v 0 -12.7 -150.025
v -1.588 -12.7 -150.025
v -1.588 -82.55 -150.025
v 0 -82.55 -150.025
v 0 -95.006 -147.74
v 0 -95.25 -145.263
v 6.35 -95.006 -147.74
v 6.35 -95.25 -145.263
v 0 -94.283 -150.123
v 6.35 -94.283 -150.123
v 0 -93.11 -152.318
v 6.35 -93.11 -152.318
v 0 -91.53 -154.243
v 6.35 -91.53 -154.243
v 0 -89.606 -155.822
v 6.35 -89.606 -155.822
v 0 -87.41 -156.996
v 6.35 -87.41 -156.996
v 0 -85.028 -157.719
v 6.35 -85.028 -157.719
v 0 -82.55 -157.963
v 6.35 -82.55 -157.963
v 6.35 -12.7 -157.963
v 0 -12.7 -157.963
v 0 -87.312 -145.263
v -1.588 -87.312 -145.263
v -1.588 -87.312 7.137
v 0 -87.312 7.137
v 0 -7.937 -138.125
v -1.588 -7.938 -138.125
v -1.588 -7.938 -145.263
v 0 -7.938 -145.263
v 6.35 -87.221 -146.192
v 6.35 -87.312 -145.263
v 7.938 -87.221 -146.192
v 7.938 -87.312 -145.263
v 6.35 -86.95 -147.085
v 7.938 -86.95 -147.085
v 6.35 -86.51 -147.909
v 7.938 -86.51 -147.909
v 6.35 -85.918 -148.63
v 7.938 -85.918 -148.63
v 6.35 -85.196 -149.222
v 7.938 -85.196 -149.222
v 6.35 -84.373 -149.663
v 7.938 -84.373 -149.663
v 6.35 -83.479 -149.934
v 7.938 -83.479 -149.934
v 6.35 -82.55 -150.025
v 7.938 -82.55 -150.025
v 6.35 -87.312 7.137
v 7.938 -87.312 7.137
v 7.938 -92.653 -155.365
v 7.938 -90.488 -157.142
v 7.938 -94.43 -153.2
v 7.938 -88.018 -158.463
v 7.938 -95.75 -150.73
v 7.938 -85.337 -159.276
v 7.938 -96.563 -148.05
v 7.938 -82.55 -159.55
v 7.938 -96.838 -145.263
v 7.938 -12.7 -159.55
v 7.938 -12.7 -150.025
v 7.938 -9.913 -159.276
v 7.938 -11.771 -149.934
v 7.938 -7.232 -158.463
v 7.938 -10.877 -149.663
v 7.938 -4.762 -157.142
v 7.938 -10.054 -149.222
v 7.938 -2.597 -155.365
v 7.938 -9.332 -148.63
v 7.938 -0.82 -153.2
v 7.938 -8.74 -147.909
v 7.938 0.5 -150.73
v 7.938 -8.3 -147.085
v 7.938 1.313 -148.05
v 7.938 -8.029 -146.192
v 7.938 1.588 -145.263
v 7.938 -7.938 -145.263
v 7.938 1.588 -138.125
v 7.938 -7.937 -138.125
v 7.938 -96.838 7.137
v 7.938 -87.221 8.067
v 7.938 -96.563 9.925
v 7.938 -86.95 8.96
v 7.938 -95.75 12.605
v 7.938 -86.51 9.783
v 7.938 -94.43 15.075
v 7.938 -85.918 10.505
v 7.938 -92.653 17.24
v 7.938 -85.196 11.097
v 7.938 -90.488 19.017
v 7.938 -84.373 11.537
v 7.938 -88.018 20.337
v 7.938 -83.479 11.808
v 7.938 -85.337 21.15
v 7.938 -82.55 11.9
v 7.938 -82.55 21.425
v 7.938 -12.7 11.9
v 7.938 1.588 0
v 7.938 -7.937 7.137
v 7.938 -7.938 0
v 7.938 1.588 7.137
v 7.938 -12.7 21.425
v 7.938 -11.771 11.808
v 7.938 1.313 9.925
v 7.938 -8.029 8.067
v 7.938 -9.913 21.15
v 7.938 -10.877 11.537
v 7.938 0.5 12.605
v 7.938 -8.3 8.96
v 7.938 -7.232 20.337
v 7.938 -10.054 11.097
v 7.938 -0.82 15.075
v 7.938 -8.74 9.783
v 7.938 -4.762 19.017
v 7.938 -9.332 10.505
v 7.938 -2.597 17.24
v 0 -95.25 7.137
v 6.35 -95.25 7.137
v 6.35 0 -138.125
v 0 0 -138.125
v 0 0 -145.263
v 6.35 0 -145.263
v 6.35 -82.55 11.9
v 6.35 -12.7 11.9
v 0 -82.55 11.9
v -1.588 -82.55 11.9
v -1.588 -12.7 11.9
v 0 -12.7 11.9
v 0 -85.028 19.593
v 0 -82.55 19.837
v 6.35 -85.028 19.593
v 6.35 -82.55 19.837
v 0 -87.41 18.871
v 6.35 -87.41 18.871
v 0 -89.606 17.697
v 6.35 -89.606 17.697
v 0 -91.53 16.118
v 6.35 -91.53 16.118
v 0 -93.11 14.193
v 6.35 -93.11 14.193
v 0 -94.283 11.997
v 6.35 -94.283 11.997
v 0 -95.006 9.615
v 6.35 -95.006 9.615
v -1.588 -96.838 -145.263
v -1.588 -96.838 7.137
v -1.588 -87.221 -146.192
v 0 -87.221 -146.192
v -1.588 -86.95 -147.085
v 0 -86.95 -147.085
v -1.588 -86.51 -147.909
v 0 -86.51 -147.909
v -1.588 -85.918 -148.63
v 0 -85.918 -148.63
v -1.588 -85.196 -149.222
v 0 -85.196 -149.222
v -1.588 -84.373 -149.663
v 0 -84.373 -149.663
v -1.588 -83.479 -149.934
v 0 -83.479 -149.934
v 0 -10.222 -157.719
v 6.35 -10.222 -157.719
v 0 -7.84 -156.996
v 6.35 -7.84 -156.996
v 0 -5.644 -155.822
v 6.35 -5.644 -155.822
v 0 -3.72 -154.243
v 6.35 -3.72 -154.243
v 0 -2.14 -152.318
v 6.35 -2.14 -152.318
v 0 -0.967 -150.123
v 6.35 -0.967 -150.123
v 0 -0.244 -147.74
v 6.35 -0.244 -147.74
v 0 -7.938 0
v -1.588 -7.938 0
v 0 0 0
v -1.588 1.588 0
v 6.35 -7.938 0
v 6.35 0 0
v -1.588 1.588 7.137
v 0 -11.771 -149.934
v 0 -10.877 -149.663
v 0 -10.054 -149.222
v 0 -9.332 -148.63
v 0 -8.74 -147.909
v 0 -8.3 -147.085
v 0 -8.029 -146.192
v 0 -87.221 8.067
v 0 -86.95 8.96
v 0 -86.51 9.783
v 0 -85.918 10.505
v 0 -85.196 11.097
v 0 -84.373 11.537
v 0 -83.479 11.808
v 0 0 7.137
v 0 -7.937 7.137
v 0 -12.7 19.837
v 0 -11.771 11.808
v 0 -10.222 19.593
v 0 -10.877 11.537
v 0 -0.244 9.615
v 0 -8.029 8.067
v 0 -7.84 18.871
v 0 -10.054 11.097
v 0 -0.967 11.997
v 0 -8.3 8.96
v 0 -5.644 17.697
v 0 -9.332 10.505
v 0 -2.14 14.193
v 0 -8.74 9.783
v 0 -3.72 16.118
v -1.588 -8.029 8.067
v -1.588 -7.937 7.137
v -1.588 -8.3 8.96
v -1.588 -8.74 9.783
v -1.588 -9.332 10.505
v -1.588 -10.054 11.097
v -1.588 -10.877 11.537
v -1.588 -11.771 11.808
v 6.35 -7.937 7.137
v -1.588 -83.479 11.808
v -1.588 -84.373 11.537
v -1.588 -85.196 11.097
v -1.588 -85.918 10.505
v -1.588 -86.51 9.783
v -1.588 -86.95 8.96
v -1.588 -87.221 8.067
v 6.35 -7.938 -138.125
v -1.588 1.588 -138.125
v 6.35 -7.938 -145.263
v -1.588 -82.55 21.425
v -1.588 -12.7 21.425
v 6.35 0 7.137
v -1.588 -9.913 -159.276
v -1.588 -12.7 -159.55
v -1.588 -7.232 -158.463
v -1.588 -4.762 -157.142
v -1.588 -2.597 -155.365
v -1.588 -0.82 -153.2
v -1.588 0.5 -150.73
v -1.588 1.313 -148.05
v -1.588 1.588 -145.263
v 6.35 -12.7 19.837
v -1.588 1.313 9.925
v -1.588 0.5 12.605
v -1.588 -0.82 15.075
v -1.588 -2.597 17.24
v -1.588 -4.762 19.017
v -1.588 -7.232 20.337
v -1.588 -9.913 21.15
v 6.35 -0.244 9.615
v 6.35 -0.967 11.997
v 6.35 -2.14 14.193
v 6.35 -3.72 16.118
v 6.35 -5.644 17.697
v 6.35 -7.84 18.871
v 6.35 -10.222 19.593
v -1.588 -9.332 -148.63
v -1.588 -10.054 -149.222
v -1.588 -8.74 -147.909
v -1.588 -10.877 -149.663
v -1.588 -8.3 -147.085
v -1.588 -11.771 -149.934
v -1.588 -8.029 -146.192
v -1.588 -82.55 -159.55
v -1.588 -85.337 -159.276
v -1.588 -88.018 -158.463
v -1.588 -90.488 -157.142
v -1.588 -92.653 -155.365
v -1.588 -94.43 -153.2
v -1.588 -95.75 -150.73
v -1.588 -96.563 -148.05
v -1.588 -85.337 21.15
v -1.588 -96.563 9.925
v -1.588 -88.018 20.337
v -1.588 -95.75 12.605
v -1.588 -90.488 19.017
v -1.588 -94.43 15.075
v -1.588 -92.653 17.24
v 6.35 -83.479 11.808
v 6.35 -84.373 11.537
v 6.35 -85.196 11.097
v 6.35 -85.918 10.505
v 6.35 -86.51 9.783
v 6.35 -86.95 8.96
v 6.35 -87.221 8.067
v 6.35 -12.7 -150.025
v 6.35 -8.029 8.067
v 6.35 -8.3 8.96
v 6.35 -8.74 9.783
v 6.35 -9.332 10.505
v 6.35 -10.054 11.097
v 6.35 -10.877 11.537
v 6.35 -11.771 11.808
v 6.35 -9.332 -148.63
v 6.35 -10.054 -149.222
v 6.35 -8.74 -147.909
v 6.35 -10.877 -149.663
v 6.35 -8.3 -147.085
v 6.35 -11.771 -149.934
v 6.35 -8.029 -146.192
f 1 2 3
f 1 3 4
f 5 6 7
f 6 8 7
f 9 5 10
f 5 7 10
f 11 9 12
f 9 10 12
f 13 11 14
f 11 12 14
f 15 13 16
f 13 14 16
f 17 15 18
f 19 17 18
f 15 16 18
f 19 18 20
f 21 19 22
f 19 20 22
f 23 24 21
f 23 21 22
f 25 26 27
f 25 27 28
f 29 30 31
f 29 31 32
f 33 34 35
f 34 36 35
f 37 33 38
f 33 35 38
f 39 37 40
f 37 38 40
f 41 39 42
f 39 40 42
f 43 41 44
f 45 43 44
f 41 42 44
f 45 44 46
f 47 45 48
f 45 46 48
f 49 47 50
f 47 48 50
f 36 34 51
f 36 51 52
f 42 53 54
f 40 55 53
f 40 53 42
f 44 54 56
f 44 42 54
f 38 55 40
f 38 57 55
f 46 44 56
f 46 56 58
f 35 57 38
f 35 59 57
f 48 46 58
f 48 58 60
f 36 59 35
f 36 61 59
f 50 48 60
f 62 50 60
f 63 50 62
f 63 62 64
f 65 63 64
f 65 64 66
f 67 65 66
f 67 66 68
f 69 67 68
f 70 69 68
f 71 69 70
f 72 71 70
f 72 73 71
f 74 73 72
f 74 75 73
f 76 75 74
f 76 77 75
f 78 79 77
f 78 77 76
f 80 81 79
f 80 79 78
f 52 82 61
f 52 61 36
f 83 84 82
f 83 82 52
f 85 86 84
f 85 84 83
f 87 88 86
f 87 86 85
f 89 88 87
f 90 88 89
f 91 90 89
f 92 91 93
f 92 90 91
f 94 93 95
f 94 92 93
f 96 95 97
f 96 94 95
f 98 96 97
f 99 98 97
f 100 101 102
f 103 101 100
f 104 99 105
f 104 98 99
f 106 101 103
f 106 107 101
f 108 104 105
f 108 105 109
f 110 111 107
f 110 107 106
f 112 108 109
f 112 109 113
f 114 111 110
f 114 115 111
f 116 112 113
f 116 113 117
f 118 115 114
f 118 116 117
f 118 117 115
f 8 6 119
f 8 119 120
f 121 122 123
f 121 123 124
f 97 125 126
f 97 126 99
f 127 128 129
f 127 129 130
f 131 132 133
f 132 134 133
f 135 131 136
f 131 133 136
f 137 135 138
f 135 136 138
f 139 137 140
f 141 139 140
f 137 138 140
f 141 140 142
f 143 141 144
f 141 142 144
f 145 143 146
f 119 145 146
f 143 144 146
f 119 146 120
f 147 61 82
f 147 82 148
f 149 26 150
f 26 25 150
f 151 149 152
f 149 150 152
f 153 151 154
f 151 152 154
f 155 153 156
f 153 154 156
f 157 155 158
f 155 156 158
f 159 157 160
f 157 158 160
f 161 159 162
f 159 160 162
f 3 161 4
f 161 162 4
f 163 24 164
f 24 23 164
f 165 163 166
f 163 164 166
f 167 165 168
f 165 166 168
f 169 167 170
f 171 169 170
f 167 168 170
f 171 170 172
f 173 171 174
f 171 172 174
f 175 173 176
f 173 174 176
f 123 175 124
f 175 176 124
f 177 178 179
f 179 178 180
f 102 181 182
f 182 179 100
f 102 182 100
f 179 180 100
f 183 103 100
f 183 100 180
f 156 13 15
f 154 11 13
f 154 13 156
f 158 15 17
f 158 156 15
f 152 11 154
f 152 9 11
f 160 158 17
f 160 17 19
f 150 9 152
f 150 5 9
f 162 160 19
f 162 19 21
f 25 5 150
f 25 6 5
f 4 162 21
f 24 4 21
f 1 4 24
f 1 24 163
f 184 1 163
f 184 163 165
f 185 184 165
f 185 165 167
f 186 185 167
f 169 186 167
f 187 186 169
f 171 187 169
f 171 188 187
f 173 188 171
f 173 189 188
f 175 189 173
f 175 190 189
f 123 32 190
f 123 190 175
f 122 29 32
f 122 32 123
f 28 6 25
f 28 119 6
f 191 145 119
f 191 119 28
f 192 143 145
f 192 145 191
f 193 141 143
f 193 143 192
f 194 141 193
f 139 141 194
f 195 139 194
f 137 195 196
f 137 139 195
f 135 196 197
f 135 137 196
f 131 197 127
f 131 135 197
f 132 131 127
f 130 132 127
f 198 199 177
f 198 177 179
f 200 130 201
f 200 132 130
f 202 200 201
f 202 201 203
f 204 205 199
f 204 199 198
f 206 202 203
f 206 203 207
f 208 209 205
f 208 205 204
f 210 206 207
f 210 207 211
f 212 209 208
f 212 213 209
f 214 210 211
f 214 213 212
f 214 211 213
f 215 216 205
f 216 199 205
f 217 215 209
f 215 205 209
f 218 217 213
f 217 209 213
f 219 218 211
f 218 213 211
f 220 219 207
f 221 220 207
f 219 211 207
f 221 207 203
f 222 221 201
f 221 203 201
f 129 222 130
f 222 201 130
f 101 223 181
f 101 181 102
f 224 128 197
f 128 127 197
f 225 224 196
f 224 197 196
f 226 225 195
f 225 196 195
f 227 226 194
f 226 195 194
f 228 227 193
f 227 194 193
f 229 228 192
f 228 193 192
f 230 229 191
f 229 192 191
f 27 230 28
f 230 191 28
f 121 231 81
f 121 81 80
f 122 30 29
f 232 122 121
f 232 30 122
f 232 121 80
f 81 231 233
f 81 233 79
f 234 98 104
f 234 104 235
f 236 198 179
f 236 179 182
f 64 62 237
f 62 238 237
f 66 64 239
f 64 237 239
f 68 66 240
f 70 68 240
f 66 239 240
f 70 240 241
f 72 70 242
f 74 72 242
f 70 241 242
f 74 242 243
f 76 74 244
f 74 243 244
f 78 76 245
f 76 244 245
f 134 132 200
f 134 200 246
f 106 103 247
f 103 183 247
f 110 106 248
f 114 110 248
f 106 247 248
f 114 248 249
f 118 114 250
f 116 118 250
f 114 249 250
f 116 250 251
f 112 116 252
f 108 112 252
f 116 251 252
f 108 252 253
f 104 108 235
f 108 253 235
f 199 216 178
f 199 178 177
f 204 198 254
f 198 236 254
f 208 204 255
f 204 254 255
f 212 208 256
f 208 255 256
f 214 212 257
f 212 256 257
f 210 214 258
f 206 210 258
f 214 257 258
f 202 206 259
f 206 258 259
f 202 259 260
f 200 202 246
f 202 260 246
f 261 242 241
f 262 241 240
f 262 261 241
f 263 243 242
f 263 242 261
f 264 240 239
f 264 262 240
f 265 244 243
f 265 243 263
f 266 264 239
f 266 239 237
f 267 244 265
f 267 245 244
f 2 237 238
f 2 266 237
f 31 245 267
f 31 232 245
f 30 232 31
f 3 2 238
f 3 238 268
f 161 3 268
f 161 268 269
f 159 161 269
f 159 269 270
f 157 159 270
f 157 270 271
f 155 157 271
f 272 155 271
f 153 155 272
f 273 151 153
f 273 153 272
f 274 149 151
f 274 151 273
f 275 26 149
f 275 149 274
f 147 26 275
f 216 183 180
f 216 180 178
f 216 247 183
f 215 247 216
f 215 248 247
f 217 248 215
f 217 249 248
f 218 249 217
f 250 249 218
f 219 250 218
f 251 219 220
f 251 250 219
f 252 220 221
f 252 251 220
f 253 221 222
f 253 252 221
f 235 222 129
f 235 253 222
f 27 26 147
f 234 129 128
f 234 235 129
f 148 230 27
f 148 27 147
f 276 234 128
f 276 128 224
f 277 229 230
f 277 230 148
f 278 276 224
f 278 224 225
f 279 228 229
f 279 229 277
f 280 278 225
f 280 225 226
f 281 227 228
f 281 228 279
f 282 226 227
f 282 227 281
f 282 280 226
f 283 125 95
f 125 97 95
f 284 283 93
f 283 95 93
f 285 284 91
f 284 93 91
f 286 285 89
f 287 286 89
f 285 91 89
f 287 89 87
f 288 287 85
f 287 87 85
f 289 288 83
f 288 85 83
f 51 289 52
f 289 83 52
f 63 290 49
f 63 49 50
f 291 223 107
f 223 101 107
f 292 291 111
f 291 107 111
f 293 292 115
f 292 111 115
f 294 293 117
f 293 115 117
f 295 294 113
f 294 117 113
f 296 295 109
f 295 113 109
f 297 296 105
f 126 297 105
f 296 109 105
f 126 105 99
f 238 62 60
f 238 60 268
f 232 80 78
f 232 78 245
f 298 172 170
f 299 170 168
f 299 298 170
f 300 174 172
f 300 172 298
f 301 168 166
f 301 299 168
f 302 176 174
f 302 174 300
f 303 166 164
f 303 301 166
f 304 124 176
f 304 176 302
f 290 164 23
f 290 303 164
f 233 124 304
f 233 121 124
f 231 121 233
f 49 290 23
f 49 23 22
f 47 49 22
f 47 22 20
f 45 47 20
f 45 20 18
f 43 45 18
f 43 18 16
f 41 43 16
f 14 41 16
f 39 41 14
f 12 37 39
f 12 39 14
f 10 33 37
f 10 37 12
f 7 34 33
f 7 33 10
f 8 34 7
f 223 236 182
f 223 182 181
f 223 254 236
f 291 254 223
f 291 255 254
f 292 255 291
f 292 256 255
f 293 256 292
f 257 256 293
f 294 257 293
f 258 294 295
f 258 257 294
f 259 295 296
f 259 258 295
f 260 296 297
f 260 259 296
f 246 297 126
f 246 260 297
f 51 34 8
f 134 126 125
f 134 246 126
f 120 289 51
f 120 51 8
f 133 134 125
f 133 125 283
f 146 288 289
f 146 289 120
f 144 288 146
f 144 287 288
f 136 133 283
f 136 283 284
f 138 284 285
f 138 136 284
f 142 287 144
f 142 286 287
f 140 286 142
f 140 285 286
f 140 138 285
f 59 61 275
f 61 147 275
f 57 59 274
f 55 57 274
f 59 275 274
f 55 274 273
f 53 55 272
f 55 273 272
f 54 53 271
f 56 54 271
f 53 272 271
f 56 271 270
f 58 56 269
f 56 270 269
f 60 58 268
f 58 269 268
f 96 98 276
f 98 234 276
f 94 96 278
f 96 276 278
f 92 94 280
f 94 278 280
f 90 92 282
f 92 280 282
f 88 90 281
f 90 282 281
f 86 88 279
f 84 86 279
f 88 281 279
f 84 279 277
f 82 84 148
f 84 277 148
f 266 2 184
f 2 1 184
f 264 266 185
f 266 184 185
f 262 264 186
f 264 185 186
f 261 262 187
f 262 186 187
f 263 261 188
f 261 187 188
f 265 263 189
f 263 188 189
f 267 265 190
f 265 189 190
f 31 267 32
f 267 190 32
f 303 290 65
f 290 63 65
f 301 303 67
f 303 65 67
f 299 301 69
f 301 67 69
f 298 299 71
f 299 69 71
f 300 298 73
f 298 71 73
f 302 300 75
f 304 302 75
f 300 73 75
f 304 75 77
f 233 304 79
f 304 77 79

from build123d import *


with BuildPart() as part:
    # Sweep3: sweep along a path in Sketch3
    with BuildLine(Plane(origin=(0, 0, 0), x_dir=(0, 0, -1), z_dir=(1, 0, 0))) as sweep3_path:
        Line((0, 0), (-7.1374, 0))
        ThreePointArc((-7.1374, 0), (-16.117656121, -3.719743879), (-19.8374, -12.7))
        Line((-19.8374, -12.7), (-19.8374, -82.55))
        ThreePointArc((-19.8374, -82.55), (-16.117656121, -91.530256121), (-7.1374, -95.25))
        Line((-7.1374, -95.25), (145.2626, -95.25))
        ThreePointArc((145.2626, -95.25), (154.242856121, -91.530256121), (157.9626, -82.55))
        Line((157.9626, -82.55), (157.9626, -12.7))
        ThreePointArc((157.9626, -12.7), (154.242856121, -3.719743879), (145.2626, 0))
        Line((145.2626, 0), (138.1252, 0))
    # Sketch2 → Sweep3 (sweep)
    with BuildSketch(Plane.XY):
        Polygon((0, 0), (6.35, 0), (6.35, -7.9375), (7.9375, -7.9375), (7.9375, 1.5875), (-1.5875, 1.5875), (-1.5875, -7.9375), (0, -7.9375), align=None)
    sweep(path=sweep3_path.line)


solid = part.part
